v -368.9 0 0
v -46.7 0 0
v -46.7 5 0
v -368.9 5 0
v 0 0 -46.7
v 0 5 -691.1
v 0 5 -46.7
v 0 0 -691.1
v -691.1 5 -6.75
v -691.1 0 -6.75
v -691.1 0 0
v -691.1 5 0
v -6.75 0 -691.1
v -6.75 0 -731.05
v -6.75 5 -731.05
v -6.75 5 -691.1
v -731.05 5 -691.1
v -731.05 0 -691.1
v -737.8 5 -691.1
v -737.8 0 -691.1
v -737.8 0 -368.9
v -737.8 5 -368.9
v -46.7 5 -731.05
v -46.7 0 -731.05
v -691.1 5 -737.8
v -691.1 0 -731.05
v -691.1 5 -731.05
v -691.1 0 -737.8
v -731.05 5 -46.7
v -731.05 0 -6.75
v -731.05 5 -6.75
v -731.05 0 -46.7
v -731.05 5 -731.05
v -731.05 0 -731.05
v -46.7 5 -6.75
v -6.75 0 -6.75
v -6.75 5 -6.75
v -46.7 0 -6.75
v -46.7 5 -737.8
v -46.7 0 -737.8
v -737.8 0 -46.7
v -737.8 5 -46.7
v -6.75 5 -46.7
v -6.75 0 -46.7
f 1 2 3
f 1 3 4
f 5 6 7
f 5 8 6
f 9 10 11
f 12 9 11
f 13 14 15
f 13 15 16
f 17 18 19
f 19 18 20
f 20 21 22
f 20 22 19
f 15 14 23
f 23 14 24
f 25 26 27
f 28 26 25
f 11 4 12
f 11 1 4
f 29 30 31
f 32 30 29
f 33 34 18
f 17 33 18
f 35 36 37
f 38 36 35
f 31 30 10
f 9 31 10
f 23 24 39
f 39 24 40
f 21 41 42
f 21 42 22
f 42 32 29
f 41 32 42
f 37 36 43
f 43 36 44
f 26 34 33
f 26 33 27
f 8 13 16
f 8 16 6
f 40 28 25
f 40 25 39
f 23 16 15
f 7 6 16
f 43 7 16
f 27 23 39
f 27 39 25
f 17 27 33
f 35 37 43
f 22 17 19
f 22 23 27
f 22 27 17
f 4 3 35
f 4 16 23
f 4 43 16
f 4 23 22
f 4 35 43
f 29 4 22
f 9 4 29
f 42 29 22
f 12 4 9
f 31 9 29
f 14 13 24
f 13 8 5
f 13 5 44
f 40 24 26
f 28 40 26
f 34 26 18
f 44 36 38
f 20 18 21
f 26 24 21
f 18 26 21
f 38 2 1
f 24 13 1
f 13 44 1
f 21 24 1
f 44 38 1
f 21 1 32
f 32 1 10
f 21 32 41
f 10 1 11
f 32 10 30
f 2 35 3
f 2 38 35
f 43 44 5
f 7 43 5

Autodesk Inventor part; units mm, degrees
ref_plane "YZ Plane" through (0, 0, 0) normal (1, 0, 0) x (0, 1, 0)
ref_plane "XZ Plane" through (0, 0, 0) normal (0, 1, 0) x (-1, 0, 0)
ref_plane "XY Plane" through (0, 0, 0) normal (0, 0, 1) x (1, 0, 0)
sketch "Sketch1" plane through (0, 0, 0) normal (0, 1, 0) x (-1, 0, 0)
  line L0 (46.7, 0) -> (691.1, 0)
  line L1 (737.8, -46.7) -> (737.8, -691.1)
  line L2 (691.1, -737.8) -> (46.7, -737.8)
  line L3 (0, -691.1) -> (0, -46.7)
  line L4 (6.75, -731.05) -> (46.7, -731.05)
  line L5 (46.7, -731.05) -> (46.7, -737.8)
  line L6 (6.75, -731.05) -> (6.75, -691.1)
  line L7 (6.75, -691.1) -> (0, -691.1)
  line L8 (737.8, -691.1) -> (737.8, -368.9)
  line L9 (691.1, 0) -> (368.9, 0)
  line L10 (731.05, -731.05) -> (691.1, -731.05)
  line L11 (691.1, -731.05) -> (691.1, -737.8)
  line L12 (731.05, -731.05) -> (731.05, -691.1)
  line L13 (731.05, -691.1) -> (737.8, -691.1)
  line L14 (6.75, -6.75) -> (46.7, -6.75)
  line L15 (46.7, -6.75) -> (46.7, 0)
  line L16 (6.75, -6.75) -> (6.75, -46.7)
  line L17 (6.75, -46.7) -> (0, -46.7)
  line L18 (691.1, -6.75) -> (691.1, 0)
  line L19 (731.05, -6.75) -> (691.1, -6.75)
  line L20 (731.05, -6.75) -> (731.05, -46.7)
  line L21 (731.05, -46.7) -> (737.8, -46.7)
  point P0 (0, 0)
  point P1 (737.8, -737.8)
  point P2 (737.8, 0)
  dimension "d1" = 737.8
  dimension "d6" = 6.75
  dimension "d7" = 46.7
  dimension "d8" = 6.75
  dimension "d9" = 46.7
  dimension "d11" = 368.9
  dimension "d12" = 737.8
  dimension "d13" = 6.75
  dimension "d14" = 6.75
  dimension "d15" = 46.7
  dimension "d16" = 46.7
extrude "Extrusion1" add sketch "Sketch1" along normal blind 5
properties part number "base_floor" material "Iron, Gray"
